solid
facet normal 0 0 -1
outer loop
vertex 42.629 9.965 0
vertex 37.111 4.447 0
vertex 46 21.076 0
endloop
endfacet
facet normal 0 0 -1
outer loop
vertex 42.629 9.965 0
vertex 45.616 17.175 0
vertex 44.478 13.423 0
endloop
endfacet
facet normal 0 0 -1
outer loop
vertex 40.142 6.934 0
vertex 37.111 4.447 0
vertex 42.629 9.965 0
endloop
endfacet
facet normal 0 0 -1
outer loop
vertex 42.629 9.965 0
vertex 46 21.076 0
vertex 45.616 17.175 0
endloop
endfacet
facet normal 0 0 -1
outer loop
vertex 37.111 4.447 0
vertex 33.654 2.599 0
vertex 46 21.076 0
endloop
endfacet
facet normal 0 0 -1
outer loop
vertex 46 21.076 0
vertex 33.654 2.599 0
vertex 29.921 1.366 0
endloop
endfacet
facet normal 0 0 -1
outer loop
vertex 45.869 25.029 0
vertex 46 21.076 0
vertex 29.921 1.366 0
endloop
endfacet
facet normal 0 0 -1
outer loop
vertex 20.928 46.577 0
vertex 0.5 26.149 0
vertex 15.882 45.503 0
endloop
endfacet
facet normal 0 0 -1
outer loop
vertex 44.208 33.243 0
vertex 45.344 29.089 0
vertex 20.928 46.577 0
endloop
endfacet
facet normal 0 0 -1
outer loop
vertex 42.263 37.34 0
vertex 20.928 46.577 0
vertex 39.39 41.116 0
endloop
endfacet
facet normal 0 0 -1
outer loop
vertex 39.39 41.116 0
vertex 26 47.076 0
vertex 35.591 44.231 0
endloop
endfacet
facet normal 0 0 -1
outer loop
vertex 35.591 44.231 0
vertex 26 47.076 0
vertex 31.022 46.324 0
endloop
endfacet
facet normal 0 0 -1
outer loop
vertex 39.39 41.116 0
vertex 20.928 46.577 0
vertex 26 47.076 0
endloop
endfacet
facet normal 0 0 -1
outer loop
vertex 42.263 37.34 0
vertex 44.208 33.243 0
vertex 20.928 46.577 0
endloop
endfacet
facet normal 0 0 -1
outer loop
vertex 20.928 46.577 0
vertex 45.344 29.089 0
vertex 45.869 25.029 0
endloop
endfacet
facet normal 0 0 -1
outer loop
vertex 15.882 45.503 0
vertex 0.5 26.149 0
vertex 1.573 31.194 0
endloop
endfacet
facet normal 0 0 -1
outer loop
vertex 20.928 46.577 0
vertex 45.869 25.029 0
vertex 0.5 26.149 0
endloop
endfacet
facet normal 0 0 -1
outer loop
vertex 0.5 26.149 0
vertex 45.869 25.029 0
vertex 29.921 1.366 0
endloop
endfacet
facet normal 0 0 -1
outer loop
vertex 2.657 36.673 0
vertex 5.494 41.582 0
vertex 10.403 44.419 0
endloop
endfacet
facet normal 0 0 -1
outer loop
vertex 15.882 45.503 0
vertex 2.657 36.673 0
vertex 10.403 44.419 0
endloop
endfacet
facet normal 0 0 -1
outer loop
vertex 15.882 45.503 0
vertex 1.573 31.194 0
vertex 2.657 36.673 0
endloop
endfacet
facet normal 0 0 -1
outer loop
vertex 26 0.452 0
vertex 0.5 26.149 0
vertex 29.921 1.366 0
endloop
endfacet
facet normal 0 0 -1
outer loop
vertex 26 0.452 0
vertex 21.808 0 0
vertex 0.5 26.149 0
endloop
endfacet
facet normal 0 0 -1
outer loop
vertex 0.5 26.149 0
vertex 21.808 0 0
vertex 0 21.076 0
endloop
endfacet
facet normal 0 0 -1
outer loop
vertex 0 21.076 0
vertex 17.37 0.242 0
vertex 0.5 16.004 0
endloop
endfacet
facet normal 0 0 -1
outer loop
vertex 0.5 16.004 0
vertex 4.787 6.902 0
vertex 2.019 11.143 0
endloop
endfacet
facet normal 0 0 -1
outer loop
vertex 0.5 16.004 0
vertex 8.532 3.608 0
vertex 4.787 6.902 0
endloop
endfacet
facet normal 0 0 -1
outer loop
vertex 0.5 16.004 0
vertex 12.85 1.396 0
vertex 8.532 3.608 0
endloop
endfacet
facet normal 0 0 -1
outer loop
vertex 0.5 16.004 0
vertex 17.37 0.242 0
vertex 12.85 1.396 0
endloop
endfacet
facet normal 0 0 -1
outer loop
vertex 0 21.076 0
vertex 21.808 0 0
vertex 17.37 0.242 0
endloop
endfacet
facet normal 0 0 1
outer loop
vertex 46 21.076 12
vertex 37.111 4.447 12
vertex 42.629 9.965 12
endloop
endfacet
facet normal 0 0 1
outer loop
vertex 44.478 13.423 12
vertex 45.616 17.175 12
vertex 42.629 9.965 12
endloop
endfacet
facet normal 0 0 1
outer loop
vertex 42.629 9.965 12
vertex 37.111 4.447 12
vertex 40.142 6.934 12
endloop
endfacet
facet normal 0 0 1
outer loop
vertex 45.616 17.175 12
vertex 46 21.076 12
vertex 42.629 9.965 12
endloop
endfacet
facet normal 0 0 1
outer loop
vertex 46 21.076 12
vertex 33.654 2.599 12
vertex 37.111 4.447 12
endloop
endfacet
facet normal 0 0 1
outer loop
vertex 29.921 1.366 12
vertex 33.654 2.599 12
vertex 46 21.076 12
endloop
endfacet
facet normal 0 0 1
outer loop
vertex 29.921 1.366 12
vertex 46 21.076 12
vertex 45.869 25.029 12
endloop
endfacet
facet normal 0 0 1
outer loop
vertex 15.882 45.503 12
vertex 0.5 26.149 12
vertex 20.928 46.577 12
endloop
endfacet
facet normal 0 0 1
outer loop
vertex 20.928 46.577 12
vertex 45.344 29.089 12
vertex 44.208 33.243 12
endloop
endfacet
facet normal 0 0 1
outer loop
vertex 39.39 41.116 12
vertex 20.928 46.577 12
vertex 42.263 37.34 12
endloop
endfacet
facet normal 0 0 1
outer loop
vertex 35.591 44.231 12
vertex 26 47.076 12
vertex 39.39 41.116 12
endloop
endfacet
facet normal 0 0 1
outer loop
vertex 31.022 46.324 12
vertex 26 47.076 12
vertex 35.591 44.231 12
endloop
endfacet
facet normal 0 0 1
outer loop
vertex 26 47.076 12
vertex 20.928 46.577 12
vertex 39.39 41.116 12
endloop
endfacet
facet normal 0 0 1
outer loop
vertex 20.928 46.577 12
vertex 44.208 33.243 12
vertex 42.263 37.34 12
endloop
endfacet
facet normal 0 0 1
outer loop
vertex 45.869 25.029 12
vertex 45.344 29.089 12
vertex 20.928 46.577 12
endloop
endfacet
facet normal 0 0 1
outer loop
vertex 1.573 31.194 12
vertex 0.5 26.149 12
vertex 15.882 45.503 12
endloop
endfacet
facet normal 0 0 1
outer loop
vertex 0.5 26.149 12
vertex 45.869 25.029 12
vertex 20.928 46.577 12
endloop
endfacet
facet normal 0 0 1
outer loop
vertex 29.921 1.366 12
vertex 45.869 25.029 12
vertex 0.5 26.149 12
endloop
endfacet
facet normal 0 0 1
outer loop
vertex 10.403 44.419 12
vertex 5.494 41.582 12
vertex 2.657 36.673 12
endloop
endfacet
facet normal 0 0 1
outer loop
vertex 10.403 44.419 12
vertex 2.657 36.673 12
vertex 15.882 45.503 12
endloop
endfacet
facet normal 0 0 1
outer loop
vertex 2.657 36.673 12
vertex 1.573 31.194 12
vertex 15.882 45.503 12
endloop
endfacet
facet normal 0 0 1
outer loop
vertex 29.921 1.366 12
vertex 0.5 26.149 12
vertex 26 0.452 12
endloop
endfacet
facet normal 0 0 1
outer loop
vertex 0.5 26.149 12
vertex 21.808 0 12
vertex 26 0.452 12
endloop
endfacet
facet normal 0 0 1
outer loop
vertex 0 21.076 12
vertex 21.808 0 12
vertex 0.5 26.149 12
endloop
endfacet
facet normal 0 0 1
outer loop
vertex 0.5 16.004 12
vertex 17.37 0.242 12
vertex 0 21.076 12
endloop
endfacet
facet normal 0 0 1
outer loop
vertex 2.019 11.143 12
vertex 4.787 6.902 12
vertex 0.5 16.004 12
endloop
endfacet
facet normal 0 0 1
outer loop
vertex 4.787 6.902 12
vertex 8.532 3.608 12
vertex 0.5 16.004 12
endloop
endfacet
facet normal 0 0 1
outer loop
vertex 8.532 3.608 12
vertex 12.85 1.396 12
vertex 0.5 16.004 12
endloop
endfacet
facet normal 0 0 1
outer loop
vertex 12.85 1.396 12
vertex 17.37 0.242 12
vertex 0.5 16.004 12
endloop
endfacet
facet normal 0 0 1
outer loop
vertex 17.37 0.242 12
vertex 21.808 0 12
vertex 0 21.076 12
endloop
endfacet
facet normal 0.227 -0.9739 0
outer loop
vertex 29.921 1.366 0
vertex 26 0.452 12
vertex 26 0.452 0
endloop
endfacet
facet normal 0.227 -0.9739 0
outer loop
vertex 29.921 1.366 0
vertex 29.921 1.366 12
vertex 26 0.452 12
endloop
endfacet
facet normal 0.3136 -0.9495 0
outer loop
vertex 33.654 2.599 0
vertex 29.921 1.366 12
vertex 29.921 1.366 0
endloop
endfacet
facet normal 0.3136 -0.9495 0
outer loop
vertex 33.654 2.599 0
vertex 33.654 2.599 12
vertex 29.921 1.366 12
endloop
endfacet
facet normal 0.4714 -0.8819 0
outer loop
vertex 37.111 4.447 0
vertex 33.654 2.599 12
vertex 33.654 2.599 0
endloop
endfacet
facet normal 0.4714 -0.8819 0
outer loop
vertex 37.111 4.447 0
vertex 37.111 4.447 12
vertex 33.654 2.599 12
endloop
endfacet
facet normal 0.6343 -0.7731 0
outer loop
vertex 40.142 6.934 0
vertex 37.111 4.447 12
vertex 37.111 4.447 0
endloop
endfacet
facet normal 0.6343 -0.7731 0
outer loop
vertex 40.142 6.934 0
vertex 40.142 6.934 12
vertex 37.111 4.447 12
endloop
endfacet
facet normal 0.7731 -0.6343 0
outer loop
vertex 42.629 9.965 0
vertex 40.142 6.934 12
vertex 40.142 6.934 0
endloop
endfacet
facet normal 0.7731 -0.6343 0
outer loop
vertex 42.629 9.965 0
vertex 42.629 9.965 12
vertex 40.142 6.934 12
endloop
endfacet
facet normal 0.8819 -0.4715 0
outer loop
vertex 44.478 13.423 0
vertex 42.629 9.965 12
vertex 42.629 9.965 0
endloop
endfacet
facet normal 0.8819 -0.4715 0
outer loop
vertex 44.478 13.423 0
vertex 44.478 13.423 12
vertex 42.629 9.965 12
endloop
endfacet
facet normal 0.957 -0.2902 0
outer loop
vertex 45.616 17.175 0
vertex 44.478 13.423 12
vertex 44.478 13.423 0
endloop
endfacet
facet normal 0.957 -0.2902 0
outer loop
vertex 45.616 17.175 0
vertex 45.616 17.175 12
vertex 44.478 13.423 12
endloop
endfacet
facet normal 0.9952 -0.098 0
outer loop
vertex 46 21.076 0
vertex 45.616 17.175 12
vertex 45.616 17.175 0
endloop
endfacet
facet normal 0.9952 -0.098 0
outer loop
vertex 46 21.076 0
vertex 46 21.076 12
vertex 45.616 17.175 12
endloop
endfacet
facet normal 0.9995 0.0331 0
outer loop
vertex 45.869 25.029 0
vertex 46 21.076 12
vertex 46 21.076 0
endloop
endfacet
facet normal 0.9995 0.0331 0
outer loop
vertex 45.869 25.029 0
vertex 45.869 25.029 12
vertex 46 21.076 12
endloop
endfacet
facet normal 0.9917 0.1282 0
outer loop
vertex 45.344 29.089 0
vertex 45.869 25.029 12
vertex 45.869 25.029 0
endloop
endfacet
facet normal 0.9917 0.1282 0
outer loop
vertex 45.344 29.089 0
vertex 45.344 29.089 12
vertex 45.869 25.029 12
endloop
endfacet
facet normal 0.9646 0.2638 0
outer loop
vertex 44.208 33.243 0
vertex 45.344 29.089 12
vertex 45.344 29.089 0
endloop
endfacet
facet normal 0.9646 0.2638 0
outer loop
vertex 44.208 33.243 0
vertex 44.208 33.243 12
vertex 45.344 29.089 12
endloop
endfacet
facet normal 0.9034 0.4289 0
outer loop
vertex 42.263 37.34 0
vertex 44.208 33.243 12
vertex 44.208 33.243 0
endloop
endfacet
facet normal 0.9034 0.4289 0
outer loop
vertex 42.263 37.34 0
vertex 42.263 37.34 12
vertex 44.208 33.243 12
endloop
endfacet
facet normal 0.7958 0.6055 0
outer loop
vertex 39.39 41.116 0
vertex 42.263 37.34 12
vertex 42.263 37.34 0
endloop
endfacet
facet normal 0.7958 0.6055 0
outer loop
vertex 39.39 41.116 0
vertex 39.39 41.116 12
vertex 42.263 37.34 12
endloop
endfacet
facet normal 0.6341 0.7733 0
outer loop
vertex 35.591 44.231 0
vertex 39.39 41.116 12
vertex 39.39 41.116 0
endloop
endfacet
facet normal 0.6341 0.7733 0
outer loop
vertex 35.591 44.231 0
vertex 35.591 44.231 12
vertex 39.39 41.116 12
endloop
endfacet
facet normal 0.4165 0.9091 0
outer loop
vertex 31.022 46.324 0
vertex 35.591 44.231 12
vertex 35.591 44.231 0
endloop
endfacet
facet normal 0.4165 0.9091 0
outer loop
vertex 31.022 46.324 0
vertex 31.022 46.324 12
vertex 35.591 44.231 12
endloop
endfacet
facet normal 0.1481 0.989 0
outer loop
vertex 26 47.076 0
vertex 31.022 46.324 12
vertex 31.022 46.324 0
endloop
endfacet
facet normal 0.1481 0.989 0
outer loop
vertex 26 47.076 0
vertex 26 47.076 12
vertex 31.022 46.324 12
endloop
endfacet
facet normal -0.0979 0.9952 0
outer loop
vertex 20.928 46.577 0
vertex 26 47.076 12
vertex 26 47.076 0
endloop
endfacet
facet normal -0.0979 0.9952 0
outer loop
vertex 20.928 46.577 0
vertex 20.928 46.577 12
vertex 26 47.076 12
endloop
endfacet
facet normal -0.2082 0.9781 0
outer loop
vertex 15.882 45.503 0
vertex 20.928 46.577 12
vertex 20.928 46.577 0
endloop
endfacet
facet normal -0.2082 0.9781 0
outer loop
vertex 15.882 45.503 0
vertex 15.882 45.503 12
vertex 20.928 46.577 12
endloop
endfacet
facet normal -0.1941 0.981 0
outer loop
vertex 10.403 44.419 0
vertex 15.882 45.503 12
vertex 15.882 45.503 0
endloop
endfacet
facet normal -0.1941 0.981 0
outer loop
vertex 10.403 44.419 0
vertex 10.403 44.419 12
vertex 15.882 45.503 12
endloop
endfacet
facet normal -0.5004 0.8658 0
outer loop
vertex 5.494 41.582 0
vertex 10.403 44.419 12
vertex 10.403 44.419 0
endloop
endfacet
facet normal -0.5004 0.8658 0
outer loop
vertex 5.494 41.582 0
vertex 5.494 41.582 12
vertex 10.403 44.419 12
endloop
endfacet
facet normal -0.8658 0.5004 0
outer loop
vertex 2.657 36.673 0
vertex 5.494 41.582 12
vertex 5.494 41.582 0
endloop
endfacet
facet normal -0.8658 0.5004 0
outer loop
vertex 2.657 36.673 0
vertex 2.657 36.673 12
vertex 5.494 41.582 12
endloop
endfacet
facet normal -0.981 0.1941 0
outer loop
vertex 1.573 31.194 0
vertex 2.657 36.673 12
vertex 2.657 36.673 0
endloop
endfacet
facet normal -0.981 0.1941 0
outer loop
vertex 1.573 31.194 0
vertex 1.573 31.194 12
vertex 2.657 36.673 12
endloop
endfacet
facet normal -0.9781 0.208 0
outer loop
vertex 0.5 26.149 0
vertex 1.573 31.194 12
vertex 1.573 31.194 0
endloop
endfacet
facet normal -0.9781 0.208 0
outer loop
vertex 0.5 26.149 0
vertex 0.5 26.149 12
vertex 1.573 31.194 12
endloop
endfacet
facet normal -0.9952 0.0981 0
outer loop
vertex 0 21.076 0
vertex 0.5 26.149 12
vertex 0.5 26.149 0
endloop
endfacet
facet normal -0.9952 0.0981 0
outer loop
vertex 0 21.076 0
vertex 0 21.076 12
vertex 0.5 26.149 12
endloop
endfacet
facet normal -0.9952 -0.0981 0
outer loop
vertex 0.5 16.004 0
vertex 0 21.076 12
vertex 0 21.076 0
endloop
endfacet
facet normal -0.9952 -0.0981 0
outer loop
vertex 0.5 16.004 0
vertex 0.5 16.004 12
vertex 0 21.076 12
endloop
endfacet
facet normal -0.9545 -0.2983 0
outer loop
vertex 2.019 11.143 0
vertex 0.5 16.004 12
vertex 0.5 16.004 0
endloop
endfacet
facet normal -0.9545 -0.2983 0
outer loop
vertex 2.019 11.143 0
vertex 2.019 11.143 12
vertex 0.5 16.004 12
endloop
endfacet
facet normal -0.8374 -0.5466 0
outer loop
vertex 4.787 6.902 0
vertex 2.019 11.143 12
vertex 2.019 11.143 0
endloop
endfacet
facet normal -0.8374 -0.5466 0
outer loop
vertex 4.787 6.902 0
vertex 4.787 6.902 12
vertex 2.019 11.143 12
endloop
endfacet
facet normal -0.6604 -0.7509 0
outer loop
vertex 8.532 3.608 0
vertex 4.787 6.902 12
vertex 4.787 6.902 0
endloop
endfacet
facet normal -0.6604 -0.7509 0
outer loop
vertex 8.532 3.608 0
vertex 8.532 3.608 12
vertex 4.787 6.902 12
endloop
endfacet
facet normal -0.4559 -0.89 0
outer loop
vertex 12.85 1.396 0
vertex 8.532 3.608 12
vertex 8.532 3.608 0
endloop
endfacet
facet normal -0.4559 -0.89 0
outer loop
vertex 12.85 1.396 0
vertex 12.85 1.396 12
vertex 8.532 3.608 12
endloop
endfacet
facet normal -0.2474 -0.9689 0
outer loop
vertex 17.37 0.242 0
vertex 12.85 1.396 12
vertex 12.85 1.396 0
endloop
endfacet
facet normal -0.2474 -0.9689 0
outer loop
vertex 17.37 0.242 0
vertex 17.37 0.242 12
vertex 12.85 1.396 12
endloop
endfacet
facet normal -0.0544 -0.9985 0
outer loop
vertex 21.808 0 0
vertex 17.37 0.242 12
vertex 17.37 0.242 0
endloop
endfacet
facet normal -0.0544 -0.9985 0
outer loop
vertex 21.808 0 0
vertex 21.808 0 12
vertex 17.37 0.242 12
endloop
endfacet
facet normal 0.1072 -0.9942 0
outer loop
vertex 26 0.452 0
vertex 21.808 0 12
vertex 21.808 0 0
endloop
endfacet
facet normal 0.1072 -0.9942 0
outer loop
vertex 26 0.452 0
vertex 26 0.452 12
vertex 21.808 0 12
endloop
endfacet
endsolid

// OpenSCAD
$fn = 32;

// ----------------------------------------------------------------------
// Cam disc: base radius 20.0 mm, lift 6.0 mm, 32 profile points
// ----------------------------------------------------------------------

// --- parameters (mm) ---
profile_height = 12;      // extrusion height
profile_points = 32;      // points of the closed outline

profile = [[46, 21.076], [45.869, 25.029], [45.344, 29.089], [44.208, 33.243], [42.263, 37.34], [39.39, 41.116], [35.591, 44.231], [31.022, 46.324], [26, 47.076], [20.928, 46.577], [15.882, 45.503], [10.403, 44.419], [5.494, 41.582], [2.657, 36.673], [1.573, 31.194], [0.5, 26.149], [0, 21.076], [0.5, 16.004], [2.019, 11.143], [4.787, 6.902], [8.532, 3.608], [12.85, 1.396], [17.37, 0.242], [21.808, 0], [26, 0.452], [29.921, 1.366], [33.654, 2.599], [37.111, 4.447], [40.142, 6.934], [42.629, 9.965], [44.478, 13.423], [45.616, 17.175]];  // single closed polygon, 32 points, counter clockwise

// --- the one profile operation ---
linear_extrude(height = profile_height) polygon(points = profile);
